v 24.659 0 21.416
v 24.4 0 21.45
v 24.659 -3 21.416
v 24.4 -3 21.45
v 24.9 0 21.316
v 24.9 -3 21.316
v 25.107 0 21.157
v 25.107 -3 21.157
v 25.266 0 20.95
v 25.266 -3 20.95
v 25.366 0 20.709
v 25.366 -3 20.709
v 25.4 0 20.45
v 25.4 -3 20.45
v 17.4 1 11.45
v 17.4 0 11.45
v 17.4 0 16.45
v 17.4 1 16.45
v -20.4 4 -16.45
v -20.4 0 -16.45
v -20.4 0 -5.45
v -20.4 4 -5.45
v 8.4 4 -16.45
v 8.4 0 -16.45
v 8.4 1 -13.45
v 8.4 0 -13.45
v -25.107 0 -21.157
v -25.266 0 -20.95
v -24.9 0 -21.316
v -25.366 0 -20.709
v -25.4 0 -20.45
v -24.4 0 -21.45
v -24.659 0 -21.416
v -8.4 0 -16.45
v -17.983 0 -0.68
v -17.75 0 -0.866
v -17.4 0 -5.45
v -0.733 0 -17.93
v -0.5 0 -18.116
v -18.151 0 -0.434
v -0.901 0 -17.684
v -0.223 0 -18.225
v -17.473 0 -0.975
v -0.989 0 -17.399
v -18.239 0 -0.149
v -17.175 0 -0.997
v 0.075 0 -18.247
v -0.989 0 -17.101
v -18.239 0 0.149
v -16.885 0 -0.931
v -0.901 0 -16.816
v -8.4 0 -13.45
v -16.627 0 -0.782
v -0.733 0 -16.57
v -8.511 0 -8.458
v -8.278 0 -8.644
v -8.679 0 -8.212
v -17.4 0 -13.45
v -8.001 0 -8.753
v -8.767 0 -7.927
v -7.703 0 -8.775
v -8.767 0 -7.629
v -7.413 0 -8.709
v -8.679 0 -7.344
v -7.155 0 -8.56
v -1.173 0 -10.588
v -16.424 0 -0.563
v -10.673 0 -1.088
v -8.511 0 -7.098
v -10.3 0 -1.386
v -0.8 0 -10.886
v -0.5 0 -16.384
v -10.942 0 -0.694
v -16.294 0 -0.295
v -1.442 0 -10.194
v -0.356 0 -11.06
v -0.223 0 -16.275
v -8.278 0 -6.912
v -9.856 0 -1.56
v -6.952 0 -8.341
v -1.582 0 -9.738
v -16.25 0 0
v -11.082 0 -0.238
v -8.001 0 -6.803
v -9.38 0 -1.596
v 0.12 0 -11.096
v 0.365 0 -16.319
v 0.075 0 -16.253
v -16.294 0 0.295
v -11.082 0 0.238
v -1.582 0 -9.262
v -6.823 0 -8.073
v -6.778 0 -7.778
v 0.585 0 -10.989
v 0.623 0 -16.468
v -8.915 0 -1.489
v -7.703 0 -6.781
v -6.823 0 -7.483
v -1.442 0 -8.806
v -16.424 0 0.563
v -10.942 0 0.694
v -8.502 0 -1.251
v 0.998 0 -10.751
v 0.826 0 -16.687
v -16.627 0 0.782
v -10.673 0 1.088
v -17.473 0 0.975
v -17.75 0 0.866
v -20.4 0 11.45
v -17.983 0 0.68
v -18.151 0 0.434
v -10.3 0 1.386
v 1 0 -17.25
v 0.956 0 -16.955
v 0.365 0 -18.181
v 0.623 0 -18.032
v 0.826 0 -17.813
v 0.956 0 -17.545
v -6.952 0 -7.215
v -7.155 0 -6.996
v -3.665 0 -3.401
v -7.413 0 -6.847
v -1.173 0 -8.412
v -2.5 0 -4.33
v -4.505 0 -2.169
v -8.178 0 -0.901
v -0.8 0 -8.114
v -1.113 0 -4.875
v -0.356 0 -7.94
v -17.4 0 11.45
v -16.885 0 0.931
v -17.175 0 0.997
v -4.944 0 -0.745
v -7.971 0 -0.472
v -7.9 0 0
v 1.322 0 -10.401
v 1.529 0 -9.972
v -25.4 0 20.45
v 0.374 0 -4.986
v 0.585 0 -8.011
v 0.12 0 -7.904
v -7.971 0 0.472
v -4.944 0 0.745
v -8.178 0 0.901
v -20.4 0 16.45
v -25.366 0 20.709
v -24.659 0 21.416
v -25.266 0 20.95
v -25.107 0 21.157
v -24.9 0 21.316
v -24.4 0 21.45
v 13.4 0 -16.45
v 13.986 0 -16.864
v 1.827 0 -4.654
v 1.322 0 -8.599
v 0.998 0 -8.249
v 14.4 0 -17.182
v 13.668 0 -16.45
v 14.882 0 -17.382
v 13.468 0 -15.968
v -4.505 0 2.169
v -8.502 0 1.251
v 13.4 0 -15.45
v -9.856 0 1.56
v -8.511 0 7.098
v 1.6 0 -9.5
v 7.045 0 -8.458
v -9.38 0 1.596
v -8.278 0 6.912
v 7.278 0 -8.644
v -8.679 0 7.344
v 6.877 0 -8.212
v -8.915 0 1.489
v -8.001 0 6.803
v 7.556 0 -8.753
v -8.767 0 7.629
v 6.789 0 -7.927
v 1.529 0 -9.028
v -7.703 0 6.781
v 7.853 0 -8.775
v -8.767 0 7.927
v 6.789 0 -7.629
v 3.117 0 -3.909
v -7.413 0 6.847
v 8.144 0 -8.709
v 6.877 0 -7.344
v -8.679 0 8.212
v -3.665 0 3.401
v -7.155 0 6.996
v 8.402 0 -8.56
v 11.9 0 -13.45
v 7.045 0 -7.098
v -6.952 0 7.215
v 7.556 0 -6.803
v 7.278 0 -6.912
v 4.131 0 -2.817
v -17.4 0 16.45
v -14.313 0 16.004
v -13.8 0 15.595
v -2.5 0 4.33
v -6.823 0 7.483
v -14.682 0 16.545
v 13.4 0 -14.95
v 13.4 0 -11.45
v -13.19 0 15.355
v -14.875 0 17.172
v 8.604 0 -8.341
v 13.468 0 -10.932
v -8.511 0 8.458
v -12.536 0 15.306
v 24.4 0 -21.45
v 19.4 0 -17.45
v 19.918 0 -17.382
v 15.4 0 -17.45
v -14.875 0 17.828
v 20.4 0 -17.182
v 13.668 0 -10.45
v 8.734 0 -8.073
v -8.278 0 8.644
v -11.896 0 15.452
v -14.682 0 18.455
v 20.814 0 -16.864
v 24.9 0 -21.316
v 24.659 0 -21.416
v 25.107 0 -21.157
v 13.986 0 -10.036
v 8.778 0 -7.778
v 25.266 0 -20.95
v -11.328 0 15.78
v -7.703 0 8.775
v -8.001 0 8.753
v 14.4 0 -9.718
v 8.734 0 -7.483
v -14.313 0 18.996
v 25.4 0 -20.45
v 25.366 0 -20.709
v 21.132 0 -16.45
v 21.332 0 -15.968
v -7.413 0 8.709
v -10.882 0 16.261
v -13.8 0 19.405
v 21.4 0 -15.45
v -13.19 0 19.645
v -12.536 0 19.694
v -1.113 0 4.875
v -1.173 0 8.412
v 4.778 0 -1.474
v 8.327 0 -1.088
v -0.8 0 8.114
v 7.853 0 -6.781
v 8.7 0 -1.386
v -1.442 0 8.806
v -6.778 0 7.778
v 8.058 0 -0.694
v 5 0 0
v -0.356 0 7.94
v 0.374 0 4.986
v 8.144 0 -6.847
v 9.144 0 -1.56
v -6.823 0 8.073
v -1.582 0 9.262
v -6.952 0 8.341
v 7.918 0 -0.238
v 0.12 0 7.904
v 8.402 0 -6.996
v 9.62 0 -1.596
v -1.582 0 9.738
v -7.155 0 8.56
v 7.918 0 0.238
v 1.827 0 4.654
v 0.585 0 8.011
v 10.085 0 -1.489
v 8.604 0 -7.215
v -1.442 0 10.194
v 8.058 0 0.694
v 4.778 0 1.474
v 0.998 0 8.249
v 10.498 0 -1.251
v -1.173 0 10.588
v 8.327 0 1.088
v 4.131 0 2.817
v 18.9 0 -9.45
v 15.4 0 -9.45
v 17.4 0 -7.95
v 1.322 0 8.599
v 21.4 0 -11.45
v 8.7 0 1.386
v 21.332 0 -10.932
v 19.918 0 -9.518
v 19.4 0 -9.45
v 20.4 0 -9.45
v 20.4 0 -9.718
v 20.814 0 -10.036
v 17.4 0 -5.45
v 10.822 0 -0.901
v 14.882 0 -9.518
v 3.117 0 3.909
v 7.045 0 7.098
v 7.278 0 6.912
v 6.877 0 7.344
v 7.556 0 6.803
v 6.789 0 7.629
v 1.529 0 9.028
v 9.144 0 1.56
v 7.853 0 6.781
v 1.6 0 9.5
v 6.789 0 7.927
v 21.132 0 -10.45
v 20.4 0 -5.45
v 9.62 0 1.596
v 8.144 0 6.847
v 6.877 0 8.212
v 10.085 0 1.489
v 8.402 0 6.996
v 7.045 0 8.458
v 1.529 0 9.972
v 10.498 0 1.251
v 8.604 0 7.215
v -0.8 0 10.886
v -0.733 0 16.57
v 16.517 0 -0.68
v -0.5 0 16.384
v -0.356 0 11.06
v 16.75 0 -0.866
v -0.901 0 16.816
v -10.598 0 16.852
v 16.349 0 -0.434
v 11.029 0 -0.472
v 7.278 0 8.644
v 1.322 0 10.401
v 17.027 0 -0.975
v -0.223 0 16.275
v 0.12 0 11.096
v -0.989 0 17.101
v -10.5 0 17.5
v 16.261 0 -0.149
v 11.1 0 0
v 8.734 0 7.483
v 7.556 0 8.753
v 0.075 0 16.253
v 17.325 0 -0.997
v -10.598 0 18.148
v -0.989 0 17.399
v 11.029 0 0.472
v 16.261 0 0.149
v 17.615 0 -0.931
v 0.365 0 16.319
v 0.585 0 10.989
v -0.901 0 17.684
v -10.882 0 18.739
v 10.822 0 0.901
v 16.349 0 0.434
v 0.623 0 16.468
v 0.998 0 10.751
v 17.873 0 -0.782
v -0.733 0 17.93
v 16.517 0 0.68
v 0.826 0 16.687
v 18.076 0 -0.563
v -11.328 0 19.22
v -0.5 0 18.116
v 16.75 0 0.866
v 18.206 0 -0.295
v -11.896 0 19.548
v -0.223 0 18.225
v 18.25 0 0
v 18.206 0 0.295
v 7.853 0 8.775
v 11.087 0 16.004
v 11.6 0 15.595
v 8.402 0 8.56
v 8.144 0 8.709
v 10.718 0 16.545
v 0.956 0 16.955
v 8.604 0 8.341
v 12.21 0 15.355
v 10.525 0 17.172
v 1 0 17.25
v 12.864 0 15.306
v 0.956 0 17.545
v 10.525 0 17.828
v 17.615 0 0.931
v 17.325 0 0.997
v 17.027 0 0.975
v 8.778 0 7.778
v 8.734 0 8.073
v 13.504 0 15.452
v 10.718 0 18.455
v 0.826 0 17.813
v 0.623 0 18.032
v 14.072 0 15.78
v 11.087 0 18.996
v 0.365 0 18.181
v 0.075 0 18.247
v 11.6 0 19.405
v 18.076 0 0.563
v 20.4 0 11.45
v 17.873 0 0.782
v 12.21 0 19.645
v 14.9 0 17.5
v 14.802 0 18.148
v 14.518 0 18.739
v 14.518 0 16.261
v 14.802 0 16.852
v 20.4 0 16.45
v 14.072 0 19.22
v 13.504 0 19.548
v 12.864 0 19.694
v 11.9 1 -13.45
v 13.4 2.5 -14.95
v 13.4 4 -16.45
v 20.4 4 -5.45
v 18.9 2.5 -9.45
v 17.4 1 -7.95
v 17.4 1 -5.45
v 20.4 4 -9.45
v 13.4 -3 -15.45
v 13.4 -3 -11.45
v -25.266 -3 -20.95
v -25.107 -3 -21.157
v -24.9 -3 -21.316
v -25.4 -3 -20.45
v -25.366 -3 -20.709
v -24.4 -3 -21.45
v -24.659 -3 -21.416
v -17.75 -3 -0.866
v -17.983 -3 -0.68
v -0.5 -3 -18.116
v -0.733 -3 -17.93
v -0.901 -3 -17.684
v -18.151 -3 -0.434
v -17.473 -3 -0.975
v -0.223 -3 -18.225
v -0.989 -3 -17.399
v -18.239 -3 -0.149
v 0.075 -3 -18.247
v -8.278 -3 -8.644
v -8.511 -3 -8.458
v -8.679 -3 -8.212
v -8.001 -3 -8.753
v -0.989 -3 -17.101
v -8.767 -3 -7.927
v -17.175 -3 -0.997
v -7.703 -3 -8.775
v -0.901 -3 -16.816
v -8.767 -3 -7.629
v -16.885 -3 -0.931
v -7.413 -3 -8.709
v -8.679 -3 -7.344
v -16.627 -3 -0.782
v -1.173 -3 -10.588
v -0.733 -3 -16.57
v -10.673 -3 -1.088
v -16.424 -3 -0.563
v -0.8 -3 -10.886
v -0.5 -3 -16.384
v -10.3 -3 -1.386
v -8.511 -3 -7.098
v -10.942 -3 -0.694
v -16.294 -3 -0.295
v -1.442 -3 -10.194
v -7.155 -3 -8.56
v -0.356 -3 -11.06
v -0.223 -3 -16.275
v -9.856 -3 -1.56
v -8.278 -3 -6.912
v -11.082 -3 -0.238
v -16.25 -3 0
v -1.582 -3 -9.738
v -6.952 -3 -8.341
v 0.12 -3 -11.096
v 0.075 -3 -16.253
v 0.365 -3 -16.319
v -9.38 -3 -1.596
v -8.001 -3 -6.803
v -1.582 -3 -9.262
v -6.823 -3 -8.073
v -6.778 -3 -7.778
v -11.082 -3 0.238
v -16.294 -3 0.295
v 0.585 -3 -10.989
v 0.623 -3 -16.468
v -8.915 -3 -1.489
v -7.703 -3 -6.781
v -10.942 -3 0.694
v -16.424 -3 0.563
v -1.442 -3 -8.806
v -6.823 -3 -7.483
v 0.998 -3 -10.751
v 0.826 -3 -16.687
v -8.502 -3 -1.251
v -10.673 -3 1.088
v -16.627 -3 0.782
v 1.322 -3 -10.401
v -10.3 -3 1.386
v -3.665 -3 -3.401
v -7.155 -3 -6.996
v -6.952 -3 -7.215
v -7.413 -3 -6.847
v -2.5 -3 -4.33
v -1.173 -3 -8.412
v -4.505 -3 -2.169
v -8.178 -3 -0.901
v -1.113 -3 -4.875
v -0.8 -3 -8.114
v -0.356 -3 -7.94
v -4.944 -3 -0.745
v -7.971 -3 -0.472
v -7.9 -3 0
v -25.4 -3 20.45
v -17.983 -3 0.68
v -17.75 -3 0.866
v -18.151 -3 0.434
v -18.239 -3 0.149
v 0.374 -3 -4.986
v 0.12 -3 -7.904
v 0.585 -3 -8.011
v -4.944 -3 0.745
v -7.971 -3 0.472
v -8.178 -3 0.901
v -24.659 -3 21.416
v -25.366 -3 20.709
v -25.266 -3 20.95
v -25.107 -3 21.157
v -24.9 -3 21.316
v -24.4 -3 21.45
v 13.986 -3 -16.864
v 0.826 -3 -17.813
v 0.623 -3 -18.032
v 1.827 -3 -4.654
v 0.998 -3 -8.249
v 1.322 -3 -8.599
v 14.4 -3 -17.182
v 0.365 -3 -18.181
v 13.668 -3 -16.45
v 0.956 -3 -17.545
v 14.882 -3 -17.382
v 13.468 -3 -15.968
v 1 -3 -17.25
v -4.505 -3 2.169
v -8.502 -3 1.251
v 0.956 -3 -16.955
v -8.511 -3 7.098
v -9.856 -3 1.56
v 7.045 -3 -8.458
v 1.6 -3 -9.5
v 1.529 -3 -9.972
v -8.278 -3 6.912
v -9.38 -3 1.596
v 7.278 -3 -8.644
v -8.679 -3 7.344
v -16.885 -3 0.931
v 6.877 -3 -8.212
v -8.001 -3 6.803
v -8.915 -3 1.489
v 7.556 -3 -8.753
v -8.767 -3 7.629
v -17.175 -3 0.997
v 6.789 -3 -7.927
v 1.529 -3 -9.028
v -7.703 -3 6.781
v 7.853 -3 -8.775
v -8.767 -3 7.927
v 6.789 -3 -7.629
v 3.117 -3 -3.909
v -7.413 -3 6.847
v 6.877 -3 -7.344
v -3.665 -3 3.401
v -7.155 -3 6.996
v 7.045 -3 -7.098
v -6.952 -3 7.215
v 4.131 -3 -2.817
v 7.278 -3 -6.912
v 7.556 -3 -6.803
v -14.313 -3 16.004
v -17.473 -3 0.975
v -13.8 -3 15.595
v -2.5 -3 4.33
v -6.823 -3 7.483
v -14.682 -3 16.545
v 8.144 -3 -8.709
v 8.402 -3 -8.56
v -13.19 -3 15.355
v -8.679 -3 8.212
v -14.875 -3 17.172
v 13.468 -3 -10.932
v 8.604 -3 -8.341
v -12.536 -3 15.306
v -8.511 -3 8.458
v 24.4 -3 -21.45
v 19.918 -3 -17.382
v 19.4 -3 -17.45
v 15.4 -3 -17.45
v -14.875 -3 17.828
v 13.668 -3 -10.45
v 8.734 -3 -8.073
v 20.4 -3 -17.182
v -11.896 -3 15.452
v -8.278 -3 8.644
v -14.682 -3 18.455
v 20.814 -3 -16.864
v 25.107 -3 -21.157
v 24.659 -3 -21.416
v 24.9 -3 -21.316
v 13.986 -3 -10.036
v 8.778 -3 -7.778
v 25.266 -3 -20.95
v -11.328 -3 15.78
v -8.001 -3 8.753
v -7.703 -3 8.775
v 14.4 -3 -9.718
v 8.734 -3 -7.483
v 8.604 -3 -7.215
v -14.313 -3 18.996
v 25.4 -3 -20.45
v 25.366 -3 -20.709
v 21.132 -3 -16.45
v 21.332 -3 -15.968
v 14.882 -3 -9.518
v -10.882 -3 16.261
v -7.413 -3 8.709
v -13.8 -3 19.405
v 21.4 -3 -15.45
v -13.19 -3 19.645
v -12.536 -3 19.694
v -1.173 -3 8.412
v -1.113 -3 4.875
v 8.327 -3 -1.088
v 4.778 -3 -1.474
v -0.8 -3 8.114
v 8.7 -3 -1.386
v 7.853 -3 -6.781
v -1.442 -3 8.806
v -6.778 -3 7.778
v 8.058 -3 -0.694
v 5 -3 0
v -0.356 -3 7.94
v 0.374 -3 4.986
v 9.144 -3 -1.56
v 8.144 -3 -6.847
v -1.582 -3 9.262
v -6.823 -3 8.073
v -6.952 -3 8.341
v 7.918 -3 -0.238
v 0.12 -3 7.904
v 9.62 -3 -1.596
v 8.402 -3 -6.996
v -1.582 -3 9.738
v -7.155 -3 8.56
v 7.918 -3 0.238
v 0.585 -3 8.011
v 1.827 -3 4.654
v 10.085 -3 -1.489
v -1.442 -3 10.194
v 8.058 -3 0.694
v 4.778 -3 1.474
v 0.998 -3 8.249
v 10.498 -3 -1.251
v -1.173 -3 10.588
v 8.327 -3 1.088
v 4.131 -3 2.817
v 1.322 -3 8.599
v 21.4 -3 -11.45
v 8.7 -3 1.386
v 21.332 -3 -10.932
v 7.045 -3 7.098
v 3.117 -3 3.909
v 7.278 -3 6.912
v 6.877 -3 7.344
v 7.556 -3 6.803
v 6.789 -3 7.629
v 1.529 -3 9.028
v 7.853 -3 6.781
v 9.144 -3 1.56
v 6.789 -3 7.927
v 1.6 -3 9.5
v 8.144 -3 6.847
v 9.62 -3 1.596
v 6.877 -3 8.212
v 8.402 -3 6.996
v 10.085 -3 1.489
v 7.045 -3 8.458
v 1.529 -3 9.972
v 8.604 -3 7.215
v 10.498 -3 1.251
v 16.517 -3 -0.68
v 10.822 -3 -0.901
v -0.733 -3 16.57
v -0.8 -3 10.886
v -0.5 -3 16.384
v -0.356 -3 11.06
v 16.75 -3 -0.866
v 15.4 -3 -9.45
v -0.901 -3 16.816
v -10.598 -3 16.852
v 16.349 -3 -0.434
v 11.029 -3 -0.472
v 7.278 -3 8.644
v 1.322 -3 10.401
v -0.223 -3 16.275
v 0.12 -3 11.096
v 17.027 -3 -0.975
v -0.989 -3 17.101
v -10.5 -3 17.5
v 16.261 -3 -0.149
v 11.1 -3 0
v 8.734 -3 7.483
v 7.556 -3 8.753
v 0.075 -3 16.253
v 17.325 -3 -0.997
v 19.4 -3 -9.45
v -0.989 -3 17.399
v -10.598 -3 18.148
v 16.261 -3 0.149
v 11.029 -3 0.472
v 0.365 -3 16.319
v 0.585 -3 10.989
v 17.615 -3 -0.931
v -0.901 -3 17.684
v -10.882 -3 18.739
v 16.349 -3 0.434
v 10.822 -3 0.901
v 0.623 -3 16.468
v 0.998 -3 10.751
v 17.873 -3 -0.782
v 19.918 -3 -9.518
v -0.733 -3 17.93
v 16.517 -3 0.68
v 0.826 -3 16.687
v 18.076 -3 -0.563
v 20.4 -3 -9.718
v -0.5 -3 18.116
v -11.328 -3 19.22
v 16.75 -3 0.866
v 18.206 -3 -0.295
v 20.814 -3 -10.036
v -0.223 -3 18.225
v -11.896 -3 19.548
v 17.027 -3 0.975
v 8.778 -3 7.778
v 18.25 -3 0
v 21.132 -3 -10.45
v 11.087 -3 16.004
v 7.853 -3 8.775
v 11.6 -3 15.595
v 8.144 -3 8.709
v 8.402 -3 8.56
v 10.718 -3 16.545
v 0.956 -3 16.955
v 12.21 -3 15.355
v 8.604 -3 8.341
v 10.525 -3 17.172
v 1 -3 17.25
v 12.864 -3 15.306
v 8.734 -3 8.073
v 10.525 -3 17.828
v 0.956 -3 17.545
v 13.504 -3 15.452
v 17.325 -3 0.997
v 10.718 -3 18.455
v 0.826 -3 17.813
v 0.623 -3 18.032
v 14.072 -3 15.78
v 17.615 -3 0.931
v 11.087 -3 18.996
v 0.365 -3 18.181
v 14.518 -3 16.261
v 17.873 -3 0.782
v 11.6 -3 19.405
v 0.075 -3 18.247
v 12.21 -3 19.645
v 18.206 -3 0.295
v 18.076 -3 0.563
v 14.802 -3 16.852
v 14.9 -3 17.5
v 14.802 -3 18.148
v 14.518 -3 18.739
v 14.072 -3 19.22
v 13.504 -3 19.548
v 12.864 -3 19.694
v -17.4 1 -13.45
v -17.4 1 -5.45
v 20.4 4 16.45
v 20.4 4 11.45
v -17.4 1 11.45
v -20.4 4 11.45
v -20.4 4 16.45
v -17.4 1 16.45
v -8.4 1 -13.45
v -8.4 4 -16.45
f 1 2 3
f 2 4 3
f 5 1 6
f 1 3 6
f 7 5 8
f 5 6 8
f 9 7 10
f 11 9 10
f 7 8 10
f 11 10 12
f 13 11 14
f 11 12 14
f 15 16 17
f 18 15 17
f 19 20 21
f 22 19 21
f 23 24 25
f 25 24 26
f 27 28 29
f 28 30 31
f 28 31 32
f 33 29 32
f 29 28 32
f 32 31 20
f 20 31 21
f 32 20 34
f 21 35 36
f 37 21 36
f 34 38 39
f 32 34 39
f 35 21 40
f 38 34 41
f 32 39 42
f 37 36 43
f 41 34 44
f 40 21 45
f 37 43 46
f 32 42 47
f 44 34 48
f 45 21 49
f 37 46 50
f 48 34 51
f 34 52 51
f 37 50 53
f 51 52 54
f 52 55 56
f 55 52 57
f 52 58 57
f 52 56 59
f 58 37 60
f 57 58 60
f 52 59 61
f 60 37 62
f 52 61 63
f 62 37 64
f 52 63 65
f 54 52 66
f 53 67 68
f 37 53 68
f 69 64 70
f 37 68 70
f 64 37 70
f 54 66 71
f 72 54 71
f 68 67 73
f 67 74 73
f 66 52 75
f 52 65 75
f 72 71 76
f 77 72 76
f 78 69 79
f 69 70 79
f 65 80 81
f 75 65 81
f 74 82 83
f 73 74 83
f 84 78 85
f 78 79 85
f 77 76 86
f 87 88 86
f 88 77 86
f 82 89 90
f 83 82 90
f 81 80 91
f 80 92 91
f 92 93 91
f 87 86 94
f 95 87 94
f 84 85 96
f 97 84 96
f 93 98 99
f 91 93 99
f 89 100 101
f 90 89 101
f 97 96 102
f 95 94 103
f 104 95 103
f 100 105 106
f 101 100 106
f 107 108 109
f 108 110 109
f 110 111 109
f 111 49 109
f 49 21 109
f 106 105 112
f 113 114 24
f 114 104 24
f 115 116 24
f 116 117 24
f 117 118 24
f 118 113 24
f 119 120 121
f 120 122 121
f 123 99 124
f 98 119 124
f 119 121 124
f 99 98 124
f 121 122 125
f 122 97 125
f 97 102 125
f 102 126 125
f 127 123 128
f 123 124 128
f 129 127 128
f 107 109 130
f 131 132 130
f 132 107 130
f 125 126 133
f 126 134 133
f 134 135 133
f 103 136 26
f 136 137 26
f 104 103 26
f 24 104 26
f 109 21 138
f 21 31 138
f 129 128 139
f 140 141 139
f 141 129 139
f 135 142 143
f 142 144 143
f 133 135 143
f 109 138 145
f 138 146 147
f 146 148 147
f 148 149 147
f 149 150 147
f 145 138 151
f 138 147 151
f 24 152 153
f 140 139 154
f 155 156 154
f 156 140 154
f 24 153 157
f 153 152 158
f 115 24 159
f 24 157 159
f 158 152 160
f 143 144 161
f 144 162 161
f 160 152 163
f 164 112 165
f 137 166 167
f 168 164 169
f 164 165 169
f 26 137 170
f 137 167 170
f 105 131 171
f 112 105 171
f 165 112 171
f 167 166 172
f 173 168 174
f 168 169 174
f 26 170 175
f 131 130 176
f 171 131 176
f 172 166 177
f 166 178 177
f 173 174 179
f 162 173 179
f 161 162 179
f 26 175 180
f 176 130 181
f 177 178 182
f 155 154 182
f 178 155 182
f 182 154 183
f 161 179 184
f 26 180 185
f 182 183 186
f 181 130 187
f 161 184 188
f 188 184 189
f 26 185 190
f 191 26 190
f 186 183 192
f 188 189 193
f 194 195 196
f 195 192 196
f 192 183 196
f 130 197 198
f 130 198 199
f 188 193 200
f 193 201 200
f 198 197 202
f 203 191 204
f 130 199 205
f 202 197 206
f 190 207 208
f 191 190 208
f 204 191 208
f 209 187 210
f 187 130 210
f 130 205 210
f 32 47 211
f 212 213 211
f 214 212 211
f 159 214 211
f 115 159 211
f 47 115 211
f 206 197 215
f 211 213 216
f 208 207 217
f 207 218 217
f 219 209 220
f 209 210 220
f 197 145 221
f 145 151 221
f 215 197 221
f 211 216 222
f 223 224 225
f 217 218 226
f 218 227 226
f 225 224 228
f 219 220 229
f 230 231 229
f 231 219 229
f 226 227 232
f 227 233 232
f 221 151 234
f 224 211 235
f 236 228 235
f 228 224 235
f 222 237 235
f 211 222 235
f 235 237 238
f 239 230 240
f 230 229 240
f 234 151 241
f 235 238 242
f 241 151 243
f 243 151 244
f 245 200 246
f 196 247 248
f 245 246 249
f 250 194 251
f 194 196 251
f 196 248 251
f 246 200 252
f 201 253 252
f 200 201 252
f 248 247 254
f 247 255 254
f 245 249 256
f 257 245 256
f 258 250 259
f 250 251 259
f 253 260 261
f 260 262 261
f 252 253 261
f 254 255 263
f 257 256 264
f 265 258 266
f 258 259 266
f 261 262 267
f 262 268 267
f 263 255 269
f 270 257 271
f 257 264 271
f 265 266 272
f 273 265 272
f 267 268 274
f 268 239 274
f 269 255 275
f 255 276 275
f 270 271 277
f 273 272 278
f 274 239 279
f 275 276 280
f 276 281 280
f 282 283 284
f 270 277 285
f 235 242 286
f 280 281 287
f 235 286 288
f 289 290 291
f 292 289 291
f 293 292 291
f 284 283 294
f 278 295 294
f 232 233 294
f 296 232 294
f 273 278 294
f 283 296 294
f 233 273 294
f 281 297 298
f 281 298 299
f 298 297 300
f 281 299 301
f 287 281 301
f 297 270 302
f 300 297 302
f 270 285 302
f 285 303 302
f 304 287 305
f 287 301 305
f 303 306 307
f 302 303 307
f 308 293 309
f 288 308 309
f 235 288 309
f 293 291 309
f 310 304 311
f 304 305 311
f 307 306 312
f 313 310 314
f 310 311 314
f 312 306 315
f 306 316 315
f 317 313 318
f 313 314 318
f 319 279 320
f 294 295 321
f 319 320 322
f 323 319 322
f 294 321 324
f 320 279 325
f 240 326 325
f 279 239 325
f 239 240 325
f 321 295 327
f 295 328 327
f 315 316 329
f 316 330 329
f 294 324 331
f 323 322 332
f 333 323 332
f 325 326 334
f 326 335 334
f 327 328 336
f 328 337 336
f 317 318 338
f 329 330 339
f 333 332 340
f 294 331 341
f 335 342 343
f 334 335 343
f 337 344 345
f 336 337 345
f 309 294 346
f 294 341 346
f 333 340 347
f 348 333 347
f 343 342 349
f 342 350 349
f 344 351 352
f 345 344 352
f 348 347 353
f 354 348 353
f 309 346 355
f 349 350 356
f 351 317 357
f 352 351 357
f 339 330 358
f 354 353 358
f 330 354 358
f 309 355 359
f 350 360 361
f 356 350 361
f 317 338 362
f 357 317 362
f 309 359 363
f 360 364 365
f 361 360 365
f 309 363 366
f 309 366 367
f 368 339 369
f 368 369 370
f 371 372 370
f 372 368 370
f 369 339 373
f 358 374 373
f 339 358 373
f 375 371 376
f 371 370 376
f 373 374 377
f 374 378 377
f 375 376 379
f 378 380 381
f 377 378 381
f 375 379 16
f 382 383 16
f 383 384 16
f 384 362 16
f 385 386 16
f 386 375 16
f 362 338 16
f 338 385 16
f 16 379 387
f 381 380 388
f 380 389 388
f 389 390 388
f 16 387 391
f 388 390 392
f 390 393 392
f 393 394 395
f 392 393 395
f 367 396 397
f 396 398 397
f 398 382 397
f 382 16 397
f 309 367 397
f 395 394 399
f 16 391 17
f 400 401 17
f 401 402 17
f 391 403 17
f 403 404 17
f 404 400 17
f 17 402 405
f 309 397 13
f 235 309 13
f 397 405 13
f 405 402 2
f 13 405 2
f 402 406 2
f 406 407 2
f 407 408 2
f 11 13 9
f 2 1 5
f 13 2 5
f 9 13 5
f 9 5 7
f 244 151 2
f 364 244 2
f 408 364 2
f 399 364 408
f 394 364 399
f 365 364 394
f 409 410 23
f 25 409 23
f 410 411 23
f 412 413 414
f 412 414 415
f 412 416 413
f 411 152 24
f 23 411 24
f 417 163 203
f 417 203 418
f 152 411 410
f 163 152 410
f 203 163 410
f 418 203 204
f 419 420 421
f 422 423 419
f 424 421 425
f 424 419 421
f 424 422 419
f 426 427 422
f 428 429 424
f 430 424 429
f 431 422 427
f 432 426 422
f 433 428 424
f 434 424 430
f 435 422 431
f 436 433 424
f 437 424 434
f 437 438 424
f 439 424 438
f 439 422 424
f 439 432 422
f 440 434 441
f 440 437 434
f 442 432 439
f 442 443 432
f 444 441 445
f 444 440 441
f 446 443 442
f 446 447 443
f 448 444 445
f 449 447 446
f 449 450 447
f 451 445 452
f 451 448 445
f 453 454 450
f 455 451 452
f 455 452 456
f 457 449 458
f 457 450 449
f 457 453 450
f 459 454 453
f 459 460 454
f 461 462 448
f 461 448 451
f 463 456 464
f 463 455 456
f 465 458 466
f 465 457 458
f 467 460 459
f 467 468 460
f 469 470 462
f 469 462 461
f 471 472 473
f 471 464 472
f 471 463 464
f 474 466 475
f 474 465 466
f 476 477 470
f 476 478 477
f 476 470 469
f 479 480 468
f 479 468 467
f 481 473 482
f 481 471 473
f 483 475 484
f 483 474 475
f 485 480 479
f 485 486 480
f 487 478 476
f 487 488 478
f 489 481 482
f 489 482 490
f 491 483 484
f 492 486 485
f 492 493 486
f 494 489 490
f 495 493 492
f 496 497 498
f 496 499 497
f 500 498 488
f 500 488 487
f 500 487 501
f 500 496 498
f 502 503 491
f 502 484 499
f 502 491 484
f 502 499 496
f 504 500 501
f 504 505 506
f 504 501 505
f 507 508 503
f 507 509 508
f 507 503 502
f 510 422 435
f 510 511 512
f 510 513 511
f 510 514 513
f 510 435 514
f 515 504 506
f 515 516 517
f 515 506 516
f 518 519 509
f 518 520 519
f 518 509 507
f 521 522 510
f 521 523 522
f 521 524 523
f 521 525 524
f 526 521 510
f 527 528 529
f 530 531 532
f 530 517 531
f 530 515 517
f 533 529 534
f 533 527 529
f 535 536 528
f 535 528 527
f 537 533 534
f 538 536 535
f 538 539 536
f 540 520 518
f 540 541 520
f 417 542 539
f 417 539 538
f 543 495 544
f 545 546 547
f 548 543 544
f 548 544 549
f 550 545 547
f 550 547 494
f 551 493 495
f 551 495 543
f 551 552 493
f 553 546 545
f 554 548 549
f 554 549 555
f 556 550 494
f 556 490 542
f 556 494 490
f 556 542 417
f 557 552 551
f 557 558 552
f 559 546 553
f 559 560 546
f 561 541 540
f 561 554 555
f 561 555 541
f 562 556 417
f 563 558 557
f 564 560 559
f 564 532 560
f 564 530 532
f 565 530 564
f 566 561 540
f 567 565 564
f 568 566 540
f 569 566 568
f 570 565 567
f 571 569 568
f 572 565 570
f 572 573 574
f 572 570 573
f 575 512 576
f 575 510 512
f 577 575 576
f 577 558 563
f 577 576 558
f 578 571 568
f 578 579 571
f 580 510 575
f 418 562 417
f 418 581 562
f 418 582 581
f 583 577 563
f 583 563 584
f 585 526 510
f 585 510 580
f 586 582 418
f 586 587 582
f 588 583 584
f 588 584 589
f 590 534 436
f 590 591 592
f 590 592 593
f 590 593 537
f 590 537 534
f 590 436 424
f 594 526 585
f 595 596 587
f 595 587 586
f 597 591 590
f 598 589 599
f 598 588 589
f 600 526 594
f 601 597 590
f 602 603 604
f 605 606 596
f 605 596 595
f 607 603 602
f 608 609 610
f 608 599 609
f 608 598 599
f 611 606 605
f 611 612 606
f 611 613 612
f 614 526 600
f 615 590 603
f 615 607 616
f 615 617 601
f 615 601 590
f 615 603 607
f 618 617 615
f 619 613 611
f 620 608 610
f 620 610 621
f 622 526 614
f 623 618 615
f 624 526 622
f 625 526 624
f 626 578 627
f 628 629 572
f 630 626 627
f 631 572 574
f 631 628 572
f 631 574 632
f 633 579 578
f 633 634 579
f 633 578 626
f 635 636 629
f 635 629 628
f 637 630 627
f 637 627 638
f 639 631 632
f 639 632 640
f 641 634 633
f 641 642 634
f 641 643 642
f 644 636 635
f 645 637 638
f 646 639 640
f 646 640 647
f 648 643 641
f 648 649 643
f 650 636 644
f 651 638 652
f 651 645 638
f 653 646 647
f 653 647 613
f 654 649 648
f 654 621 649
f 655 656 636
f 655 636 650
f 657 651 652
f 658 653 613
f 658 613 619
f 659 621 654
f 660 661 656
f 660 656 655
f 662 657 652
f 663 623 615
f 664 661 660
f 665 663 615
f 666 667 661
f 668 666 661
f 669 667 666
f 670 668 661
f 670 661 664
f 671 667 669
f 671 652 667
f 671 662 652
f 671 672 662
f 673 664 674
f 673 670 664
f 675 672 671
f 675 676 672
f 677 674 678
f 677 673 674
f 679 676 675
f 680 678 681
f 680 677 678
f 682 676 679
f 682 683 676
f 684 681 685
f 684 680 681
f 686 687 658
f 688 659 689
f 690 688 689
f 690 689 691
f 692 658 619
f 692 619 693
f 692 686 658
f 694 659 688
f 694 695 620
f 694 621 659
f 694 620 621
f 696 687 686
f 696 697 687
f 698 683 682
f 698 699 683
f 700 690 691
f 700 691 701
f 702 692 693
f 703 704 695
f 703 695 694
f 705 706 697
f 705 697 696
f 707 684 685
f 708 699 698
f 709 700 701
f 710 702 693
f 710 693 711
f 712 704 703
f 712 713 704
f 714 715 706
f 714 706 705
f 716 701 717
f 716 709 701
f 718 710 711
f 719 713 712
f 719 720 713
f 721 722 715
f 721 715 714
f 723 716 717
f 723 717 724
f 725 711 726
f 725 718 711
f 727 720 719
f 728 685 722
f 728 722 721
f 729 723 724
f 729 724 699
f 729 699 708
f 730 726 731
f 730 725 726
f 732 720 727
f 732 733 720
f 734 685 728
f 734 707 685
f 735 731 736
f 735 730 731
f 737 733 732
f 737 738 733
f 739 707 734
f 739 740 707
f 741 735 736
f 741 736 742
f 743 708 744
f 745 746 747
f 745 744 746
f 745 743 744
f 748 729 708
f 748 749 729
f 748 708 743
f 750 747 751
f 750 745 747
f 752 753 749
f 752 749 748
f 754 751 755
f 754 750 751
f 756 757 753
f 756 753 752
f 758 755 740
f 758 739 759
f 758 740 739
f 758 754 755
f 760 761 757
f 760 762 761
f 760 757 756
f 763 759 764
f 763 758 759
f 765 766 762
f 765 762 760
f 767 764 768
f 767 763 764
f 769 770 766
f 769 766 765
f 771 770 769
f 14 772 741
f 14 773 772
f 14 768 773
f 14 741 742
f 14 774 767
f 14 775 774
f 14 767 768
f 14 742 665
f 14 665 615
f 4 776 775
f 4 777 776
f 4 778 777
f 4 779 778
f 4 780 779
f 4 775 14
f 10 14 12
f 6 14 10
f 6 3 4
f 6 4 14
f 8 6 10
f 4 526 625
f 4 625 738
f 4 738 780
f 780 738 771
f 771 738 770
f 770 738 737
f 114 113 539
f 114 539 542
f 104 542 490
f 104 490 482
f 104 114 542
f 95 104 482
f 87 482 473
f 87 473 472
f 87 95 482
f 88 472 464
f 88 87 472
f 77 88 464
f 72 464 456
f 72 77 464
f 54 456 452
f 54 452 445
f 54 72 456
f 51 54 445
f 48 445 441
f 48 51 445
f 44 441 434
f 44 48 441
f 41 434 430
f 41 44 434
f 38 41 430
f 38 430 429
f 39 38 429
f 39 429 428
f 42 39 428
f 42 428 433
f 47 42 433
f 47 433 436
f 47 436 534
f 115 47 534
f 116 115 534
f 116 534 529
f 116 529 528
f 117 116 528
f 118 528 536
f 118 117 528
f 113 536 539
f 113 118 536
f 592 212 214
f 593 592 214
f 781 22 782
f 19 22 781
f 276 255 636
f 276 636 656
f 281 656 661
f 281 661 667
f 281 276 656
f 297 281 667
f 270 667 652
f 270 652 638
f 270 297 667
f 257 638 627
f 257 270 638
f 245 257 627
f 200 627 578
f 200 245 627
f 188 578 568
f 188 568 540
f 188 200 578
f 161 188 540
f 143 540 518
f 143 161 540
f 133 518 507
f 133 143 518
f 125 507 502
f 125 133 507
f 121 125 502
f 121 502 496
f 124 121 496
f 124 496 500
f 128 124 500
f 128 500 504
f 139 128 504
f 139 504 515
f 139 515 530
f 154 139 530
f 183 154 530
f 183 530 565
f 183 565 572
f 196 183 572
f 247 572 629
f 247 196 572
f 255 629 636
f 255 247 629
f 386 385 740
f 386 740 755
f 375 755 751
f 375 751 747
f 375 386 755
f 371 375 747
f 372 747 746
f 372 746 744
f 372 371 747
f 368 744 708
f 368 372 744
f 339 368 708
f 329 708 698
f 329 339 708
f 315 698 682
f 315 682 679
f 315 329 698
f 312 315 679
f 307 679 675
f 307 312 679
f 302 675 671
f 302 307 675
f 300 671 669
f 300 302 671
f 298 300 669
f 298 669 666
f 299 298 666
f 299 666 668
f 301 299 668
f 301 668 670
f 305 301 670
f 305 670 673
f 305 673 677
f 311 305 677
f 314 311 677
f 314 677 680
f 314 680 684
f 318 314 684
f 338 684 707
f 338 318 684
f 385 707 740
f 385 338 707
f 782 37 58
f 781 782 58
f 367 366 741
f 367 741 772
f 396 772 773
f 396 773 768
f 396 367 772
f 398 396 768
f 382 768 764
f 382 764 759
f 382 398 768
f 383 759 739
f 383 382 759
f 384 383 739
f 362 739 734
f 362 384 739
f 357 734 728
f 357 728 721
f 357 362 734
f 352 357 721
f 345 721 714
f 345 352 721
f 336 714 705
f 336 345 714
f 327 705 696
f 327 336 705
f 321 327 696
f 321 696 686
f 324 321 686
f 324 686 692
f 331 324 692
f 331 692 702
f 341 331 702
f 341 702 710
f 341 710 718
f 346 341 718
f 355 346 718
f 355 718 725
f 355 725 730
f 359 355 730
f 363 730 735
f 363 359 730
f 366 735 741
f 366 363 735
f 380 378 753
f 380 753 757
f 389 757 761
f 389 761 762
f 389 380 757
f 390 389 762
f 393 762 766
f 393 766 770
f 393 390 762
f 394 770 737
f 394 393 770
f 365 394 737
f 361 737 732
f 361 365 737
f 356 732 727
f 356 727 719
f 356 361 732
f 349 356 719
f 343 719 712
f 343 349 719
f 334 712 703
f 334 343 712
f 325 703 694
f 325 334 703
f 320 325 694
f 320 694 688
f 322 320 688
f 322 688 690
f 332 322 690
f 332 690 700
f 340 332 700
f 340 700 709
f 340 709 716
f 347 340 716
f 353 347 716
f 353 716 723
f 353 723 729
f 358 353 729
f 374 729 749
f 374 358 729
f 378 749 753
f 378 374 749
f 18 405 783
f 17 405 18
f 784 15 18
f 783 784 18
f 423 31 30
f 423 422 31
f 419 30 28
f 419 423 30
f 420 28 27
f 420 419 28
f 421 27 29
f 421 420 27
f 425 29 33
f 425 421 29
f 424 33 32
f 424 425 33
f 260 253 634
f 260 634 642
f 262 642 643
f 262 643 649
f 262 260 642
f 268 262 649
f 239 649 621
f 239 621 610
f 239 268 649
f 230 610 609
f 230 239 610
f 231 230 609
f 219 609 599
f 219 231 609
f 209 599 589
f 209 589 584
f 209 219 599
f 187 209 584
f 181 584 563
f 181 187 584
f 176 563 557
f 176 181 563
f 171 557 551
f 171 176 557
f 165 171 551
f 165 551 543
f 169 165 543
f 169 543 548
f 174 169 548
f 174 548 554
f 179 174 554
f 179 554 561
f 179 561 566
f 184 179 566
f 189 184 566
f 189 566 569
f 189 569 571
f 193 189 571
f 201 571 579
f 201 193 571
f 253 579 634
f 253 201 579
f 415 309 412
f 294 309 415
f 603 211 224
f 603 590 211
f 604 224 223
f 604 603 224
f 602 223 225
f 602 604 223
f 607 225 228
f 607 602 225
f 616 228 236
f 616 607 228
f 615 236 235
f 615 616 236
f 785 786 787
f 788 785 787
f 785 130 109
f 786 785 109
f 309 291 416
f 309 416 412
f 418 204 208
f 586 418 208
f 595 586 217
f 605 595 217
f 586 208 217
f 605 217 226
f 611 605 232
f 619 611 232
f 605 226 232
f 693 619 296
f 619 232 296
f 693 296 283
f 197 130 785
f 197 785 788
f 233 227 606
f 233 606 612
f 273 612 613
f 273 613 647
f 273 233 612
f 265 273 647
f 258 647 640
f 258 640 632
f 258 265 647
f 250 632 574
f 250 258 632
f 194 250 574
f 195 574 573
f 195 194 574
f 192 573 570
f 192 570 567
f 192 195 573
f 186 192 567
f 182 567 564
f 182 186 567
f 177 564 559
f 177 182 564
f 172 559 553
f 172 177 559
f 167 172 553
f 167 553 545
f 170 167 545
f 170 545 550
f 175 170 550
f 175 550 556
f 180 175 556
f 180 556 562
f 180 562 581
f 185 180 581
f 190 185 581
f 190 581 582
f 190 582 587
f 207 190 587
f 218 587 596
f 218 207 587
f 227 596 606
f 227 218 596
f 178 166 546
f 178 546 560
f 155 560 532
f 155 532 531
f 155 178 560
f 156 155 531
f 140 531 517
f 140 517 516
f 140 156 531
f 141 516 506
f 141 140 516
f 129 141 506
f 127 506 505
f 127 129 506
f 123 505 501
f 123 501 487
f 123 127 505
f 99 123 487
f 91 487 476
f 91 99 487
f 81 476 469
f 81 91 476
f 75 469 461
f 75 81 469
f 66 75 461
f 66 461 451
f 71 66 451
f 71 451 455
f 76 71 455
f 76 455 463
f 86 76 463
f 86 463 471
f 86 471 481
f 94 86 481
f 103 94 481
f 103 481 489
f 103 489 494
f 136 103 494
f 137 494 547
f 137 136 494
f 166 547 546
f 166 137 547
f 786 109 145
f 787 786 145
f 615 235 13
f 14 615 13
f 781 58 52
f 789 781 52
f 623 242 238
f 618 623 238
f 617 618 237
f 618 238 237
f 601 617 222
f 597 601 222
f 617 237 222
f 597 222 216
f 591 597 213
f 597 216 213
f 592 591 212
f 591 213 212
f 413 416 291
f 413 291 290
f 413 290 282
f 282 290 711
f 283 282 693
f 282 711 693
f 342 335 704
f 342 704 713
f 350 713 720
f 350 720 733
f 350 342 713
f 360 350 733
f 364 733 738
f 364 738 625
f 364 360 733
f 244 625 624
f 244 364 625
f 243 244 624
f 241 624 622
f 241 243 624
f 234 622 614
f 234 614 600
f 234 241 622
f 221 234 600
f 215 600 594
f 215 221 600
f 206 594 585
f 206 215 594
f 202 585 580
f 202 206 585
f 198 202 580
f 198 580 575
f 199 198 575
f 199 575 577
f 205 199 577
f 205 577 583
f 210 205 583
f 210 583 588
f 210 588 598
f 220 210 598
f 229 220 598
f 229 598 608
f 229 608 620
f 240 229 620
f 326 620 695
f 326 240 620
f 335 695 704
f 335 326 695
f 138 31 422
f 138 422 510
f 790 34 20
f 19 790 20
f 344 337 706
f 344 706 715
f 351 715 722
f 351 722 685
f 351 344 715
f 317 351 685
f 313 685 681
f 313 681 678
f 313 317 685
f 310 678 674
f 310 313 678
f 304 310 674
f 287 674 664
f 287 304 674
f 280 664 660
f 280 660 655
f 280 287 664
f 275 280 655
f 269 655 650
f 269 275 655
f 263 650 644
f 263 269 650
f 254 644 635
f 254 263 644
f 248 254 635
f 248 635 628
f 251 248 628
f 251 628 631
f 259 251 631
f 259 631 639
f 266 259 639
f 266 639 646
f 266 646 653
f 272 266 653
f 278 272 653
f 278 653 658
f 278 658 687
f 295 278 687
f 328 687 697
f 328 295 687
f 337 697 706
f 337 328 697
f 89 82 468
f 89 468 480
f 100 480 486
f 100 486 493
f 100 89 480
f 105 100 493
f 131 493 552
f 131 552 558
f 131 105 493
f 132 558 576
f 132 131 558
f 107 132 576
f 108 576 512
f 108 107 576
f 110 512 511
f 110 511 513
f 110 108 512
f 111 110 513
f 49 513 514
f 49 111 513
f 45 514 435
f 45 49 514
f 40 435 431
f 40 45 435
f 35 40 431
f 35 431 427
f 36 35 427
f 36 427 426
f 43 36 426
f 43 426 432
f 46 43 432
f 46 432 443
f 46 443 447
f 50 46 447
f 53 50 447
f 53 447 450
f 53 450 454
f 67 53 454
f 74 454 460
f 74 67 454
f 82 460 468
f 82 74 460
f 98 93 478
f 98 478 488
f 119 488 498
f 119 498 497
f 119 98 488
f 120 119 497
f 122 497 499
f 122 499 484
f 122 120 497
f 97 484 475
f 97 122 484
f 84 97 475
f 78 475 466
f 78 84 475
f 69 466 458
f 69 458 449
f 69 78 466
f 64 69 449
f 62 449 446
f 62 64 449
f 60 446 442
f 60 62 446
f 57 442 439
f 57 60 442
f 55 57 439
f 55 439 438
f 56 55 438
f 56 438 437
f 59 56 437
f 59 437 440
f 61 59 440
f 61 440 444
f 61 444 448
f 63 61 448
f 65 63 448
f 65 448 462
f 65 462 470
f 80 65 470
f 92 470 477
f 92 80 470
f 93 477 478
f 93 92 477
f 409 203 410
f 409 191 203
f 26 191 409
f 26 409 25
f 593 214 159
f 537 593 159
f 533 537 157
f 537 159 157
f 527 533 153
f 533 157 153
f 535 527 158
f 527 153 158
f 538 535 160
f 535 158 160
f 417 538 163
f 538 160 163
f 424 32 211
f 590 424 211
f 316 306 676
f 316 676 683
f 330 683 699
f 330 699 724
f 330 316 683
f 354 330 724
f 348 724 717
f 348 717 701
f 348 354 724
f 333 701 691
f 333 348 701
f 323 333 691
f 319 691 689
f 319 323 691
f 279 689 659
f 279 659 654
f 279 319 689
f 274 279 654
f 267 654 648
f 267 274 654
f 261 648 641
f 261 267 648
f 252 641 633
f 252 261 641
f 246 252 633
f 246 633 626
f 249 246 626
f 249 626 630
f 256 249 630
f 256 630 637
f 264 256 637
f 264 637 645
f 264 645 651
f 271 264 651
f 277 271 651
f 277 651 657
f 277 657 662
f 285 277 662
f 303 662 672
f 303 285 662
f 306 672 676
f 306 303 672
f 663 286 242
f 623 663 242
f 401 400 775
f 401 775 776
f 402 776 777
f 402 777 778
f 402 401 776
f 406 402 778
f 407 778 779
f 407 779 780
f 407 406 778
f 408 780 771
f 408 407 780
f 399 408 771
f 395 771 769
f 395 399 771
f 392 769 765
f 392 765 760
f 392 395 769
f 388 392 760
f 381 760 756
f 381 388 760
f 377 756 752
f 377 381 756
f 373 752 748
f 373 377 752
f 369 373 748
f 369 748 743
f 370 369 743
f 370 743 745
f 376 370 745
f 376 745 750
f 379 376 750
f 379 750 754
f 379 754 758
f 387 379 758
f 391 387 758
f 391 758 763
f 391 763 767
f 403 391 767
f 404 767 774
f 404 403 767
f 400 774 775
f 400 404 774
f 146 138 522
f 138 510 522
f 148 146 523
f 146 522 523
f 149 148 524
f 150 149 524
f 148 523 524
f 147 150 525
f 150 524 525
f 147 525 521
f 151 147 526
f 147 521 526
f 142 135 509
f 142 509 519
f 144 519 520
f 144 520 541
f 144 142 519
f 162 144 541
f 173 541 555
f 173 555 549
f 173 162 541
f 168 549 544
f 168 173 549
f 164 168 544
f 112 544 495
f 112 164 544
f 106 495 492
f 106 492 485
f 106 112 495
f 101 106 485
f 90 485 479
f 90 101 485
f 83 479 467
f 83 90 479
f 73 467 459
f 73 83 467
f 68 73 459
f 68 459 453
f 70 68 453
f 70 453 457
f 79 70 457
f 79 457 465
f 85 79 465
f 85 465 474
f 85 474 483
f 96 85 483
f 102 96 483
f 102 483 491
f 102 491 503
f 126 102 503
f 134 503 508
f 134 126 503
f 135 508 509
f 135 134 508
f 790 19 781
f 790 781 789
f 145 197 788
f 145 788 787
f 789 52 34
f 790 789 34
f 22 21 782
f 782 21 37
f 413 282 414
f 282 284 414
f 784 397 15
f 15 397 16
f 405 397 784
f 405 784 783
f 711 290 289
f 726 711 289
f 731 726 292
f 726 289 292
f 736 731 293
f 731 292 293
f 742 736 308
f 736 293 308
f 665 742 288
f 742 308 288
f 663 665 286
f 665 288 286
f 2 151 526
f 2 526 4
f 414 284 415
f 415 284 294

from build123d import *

# Parameters (mm, degrees)
F0_W     = 50.8
F0_H     = 42.9
F0_R     = 1
F0_R_2   = 1.6
F0_R_3   = 5
F0_R_4   = 2.2
F1_DEPTH = 3
F2_R     = 1
F3_W     = 3
F3_H     = 5
F3_H_2   = 4
F3_W_2   = 5
F3_H_3   = 3
F4_DEPTH = 4
F5_SIZE  = 1.5
F6_SIZE  = 2.99999
F7_SIZE  = 2.99999


# Not quite as in the source:
# - a fillet or chamfer is up to 0.001 mm smaller than in the source, because OpenCascade refuses the exact size


with BuildPart() as f1:
    # F0 (on Front) → F1 (new body)
    with BuildSketch(Plane.XZ):
        Rectangle(F0_W, F0_H)
        with Locations((0, -17.25)):
            Circle(F0_R, mode=Mode.SUBTRACT)
        with Locations((-7.7781745931, -7.7781745931)):
            Circle(F0_R, mode=Mode.SUBTRACT)
        with Locations((0, -9.5)):
            Circle(F0_R_2, mode=Mode.SUBTRACT)
        with BuildLine():
            ThreePointArc((21.4, -15.45), (20.8142135624, -16.8642135624), (19.4, -17.45))
            Line((19.4, -17.45), (15.4, -17.45))
            ThreePointArc((15.4, -17.45), (13.9857864376, -16.8642135624), (13.4, -15.45))
            Line((13.4, -15.45), (13.4, -11.45))
            ThreePointArc((13.4, -11.45), (13.9857864376, -10.0357864376), (15.4, -9.45))
            Line((15.4, -9.45), (19.4, -9.45))
            ThreePointArc((19.4, -9.45), (20.8142135624, -10.0357864376), (21.4, -11.45))
            Line((21.4, -11.45), (21.4, -15.45))
        make_face(mode=Mode.SUBTRACT)
        with Locations((7.7781745931, -7.7781745931)):
            Circle(F0_R, mode=Mode.SUBTRACT)
        with Locations((-17.25, 0)):
            Circle(F0_R, mode=Mode.SUBTRACT)
        with Locations((-9.5, 0)):
            Circle(F0_R_2, mode=Mode.SUBTRACT)
        Circle(F0_R_3, mode=Mode.SUBTRACT)
        with Locations((-7.7781745931, 7.7781745931)):
            Circle(F0_R, mode=Mode.SUBTRACT)
        with Locations((0, 9.5)):
            Circle(F0_R_2, mode=Mode.SUBTRACT)
        with Locations((-12.7, 17.5)):
            Circle(F0_R_4, mode=Mode.SUBTRACT)
        with Locations((0, 17.25)):
            Circle(F0_R, mode=Mode.SUBTRACT)
        with Locations((9.5, 0)):
            Circle(F0_R_2, mode=Mode.SUBTRACT)
        with Locations((7.7781745931, 7.7781745931)):
            Circle(F0_R, mode=Mode.SUBTRACT)
        with Locations((17.25, 0)):
            Circle(F0_R, mode=Mode.SUBTRACT)
        with Locations((12.7, 17.5)):
            Circle(F0_R_4, mode=Mode.SUBTRACT)
    extrude(amount=F1_DEPTH)

    # F2
    f2_edges = [f1.edges().sort_by_distance(p)[0] for p in [
        (25.4, -1.5, 21.45),
        (25.4, -1.5, -21.45),
        (-25.4, -1.5, -21.45),
        (-25.4, -1.5, 21.45),
    ]]
    fillet(f2_edges, radius=F2_R)

    # F3 (on face) → F4 (join)
    with BuildSketch(Plane(origin=(0, 0, 0), x_dir=(-1, 0, 0), z_dir=(0, 1, 0))):
        with Locations((-18.9, 13.95)):
            Rectangle(F3_W, F3_H)
        with Locations((-18.9, -7.45)):
            Rectangle(F3_W, F3_H_2)
        with Locations((18.9, 13.95)):
            Rectangle(F3_W, F3_H)
        Polygon((20.4, -16.45), (20.4, -5.45), (17.4, -5.45), (17.4, -13.45), (8.4, -13.45), (8.4, -16.45), align=None)
        with Locations((-10.9, -14.95)):
            Rectangle(F3_W_2, F3_H_3)
    extrude(amount=F4_DEPTH)

    # F5
    f5_edges = [f1.edges().sort_by_distance(p)[0] for p in [
        (13.4, 2, -13.45),
        (17.4, 2, -9.45),
    ]]
    chamfer(f5_edges, length=F5_SIZE)

    # F6 (size 3 in the source; OpenCascade refuses exactly that, so slightly less here)
    f6_edges = [f1.edges().sort_by_distance(p)[0] for p in [
        (17.4, 4, 13.95),
    ]]
    chamfer(f6_edges, length=F6_SIZE)

    # F7 (size 3 in the source; OpenCascade refuses exactly that, so slightly less here)
    f7_edges = [f1.edges().sort_by_distance(p)[0] for p in [
        (-17.4, 4, 13.95),
        (-17.4, 4, -9.45),
        (-12.9, 4, -13.45),
        (10.15, 4, -13.45),
        (17.4, 4, -6.7),
    ]]
    chamfer(f7_edges, length=F7_SIZE)


solid = f1.part
